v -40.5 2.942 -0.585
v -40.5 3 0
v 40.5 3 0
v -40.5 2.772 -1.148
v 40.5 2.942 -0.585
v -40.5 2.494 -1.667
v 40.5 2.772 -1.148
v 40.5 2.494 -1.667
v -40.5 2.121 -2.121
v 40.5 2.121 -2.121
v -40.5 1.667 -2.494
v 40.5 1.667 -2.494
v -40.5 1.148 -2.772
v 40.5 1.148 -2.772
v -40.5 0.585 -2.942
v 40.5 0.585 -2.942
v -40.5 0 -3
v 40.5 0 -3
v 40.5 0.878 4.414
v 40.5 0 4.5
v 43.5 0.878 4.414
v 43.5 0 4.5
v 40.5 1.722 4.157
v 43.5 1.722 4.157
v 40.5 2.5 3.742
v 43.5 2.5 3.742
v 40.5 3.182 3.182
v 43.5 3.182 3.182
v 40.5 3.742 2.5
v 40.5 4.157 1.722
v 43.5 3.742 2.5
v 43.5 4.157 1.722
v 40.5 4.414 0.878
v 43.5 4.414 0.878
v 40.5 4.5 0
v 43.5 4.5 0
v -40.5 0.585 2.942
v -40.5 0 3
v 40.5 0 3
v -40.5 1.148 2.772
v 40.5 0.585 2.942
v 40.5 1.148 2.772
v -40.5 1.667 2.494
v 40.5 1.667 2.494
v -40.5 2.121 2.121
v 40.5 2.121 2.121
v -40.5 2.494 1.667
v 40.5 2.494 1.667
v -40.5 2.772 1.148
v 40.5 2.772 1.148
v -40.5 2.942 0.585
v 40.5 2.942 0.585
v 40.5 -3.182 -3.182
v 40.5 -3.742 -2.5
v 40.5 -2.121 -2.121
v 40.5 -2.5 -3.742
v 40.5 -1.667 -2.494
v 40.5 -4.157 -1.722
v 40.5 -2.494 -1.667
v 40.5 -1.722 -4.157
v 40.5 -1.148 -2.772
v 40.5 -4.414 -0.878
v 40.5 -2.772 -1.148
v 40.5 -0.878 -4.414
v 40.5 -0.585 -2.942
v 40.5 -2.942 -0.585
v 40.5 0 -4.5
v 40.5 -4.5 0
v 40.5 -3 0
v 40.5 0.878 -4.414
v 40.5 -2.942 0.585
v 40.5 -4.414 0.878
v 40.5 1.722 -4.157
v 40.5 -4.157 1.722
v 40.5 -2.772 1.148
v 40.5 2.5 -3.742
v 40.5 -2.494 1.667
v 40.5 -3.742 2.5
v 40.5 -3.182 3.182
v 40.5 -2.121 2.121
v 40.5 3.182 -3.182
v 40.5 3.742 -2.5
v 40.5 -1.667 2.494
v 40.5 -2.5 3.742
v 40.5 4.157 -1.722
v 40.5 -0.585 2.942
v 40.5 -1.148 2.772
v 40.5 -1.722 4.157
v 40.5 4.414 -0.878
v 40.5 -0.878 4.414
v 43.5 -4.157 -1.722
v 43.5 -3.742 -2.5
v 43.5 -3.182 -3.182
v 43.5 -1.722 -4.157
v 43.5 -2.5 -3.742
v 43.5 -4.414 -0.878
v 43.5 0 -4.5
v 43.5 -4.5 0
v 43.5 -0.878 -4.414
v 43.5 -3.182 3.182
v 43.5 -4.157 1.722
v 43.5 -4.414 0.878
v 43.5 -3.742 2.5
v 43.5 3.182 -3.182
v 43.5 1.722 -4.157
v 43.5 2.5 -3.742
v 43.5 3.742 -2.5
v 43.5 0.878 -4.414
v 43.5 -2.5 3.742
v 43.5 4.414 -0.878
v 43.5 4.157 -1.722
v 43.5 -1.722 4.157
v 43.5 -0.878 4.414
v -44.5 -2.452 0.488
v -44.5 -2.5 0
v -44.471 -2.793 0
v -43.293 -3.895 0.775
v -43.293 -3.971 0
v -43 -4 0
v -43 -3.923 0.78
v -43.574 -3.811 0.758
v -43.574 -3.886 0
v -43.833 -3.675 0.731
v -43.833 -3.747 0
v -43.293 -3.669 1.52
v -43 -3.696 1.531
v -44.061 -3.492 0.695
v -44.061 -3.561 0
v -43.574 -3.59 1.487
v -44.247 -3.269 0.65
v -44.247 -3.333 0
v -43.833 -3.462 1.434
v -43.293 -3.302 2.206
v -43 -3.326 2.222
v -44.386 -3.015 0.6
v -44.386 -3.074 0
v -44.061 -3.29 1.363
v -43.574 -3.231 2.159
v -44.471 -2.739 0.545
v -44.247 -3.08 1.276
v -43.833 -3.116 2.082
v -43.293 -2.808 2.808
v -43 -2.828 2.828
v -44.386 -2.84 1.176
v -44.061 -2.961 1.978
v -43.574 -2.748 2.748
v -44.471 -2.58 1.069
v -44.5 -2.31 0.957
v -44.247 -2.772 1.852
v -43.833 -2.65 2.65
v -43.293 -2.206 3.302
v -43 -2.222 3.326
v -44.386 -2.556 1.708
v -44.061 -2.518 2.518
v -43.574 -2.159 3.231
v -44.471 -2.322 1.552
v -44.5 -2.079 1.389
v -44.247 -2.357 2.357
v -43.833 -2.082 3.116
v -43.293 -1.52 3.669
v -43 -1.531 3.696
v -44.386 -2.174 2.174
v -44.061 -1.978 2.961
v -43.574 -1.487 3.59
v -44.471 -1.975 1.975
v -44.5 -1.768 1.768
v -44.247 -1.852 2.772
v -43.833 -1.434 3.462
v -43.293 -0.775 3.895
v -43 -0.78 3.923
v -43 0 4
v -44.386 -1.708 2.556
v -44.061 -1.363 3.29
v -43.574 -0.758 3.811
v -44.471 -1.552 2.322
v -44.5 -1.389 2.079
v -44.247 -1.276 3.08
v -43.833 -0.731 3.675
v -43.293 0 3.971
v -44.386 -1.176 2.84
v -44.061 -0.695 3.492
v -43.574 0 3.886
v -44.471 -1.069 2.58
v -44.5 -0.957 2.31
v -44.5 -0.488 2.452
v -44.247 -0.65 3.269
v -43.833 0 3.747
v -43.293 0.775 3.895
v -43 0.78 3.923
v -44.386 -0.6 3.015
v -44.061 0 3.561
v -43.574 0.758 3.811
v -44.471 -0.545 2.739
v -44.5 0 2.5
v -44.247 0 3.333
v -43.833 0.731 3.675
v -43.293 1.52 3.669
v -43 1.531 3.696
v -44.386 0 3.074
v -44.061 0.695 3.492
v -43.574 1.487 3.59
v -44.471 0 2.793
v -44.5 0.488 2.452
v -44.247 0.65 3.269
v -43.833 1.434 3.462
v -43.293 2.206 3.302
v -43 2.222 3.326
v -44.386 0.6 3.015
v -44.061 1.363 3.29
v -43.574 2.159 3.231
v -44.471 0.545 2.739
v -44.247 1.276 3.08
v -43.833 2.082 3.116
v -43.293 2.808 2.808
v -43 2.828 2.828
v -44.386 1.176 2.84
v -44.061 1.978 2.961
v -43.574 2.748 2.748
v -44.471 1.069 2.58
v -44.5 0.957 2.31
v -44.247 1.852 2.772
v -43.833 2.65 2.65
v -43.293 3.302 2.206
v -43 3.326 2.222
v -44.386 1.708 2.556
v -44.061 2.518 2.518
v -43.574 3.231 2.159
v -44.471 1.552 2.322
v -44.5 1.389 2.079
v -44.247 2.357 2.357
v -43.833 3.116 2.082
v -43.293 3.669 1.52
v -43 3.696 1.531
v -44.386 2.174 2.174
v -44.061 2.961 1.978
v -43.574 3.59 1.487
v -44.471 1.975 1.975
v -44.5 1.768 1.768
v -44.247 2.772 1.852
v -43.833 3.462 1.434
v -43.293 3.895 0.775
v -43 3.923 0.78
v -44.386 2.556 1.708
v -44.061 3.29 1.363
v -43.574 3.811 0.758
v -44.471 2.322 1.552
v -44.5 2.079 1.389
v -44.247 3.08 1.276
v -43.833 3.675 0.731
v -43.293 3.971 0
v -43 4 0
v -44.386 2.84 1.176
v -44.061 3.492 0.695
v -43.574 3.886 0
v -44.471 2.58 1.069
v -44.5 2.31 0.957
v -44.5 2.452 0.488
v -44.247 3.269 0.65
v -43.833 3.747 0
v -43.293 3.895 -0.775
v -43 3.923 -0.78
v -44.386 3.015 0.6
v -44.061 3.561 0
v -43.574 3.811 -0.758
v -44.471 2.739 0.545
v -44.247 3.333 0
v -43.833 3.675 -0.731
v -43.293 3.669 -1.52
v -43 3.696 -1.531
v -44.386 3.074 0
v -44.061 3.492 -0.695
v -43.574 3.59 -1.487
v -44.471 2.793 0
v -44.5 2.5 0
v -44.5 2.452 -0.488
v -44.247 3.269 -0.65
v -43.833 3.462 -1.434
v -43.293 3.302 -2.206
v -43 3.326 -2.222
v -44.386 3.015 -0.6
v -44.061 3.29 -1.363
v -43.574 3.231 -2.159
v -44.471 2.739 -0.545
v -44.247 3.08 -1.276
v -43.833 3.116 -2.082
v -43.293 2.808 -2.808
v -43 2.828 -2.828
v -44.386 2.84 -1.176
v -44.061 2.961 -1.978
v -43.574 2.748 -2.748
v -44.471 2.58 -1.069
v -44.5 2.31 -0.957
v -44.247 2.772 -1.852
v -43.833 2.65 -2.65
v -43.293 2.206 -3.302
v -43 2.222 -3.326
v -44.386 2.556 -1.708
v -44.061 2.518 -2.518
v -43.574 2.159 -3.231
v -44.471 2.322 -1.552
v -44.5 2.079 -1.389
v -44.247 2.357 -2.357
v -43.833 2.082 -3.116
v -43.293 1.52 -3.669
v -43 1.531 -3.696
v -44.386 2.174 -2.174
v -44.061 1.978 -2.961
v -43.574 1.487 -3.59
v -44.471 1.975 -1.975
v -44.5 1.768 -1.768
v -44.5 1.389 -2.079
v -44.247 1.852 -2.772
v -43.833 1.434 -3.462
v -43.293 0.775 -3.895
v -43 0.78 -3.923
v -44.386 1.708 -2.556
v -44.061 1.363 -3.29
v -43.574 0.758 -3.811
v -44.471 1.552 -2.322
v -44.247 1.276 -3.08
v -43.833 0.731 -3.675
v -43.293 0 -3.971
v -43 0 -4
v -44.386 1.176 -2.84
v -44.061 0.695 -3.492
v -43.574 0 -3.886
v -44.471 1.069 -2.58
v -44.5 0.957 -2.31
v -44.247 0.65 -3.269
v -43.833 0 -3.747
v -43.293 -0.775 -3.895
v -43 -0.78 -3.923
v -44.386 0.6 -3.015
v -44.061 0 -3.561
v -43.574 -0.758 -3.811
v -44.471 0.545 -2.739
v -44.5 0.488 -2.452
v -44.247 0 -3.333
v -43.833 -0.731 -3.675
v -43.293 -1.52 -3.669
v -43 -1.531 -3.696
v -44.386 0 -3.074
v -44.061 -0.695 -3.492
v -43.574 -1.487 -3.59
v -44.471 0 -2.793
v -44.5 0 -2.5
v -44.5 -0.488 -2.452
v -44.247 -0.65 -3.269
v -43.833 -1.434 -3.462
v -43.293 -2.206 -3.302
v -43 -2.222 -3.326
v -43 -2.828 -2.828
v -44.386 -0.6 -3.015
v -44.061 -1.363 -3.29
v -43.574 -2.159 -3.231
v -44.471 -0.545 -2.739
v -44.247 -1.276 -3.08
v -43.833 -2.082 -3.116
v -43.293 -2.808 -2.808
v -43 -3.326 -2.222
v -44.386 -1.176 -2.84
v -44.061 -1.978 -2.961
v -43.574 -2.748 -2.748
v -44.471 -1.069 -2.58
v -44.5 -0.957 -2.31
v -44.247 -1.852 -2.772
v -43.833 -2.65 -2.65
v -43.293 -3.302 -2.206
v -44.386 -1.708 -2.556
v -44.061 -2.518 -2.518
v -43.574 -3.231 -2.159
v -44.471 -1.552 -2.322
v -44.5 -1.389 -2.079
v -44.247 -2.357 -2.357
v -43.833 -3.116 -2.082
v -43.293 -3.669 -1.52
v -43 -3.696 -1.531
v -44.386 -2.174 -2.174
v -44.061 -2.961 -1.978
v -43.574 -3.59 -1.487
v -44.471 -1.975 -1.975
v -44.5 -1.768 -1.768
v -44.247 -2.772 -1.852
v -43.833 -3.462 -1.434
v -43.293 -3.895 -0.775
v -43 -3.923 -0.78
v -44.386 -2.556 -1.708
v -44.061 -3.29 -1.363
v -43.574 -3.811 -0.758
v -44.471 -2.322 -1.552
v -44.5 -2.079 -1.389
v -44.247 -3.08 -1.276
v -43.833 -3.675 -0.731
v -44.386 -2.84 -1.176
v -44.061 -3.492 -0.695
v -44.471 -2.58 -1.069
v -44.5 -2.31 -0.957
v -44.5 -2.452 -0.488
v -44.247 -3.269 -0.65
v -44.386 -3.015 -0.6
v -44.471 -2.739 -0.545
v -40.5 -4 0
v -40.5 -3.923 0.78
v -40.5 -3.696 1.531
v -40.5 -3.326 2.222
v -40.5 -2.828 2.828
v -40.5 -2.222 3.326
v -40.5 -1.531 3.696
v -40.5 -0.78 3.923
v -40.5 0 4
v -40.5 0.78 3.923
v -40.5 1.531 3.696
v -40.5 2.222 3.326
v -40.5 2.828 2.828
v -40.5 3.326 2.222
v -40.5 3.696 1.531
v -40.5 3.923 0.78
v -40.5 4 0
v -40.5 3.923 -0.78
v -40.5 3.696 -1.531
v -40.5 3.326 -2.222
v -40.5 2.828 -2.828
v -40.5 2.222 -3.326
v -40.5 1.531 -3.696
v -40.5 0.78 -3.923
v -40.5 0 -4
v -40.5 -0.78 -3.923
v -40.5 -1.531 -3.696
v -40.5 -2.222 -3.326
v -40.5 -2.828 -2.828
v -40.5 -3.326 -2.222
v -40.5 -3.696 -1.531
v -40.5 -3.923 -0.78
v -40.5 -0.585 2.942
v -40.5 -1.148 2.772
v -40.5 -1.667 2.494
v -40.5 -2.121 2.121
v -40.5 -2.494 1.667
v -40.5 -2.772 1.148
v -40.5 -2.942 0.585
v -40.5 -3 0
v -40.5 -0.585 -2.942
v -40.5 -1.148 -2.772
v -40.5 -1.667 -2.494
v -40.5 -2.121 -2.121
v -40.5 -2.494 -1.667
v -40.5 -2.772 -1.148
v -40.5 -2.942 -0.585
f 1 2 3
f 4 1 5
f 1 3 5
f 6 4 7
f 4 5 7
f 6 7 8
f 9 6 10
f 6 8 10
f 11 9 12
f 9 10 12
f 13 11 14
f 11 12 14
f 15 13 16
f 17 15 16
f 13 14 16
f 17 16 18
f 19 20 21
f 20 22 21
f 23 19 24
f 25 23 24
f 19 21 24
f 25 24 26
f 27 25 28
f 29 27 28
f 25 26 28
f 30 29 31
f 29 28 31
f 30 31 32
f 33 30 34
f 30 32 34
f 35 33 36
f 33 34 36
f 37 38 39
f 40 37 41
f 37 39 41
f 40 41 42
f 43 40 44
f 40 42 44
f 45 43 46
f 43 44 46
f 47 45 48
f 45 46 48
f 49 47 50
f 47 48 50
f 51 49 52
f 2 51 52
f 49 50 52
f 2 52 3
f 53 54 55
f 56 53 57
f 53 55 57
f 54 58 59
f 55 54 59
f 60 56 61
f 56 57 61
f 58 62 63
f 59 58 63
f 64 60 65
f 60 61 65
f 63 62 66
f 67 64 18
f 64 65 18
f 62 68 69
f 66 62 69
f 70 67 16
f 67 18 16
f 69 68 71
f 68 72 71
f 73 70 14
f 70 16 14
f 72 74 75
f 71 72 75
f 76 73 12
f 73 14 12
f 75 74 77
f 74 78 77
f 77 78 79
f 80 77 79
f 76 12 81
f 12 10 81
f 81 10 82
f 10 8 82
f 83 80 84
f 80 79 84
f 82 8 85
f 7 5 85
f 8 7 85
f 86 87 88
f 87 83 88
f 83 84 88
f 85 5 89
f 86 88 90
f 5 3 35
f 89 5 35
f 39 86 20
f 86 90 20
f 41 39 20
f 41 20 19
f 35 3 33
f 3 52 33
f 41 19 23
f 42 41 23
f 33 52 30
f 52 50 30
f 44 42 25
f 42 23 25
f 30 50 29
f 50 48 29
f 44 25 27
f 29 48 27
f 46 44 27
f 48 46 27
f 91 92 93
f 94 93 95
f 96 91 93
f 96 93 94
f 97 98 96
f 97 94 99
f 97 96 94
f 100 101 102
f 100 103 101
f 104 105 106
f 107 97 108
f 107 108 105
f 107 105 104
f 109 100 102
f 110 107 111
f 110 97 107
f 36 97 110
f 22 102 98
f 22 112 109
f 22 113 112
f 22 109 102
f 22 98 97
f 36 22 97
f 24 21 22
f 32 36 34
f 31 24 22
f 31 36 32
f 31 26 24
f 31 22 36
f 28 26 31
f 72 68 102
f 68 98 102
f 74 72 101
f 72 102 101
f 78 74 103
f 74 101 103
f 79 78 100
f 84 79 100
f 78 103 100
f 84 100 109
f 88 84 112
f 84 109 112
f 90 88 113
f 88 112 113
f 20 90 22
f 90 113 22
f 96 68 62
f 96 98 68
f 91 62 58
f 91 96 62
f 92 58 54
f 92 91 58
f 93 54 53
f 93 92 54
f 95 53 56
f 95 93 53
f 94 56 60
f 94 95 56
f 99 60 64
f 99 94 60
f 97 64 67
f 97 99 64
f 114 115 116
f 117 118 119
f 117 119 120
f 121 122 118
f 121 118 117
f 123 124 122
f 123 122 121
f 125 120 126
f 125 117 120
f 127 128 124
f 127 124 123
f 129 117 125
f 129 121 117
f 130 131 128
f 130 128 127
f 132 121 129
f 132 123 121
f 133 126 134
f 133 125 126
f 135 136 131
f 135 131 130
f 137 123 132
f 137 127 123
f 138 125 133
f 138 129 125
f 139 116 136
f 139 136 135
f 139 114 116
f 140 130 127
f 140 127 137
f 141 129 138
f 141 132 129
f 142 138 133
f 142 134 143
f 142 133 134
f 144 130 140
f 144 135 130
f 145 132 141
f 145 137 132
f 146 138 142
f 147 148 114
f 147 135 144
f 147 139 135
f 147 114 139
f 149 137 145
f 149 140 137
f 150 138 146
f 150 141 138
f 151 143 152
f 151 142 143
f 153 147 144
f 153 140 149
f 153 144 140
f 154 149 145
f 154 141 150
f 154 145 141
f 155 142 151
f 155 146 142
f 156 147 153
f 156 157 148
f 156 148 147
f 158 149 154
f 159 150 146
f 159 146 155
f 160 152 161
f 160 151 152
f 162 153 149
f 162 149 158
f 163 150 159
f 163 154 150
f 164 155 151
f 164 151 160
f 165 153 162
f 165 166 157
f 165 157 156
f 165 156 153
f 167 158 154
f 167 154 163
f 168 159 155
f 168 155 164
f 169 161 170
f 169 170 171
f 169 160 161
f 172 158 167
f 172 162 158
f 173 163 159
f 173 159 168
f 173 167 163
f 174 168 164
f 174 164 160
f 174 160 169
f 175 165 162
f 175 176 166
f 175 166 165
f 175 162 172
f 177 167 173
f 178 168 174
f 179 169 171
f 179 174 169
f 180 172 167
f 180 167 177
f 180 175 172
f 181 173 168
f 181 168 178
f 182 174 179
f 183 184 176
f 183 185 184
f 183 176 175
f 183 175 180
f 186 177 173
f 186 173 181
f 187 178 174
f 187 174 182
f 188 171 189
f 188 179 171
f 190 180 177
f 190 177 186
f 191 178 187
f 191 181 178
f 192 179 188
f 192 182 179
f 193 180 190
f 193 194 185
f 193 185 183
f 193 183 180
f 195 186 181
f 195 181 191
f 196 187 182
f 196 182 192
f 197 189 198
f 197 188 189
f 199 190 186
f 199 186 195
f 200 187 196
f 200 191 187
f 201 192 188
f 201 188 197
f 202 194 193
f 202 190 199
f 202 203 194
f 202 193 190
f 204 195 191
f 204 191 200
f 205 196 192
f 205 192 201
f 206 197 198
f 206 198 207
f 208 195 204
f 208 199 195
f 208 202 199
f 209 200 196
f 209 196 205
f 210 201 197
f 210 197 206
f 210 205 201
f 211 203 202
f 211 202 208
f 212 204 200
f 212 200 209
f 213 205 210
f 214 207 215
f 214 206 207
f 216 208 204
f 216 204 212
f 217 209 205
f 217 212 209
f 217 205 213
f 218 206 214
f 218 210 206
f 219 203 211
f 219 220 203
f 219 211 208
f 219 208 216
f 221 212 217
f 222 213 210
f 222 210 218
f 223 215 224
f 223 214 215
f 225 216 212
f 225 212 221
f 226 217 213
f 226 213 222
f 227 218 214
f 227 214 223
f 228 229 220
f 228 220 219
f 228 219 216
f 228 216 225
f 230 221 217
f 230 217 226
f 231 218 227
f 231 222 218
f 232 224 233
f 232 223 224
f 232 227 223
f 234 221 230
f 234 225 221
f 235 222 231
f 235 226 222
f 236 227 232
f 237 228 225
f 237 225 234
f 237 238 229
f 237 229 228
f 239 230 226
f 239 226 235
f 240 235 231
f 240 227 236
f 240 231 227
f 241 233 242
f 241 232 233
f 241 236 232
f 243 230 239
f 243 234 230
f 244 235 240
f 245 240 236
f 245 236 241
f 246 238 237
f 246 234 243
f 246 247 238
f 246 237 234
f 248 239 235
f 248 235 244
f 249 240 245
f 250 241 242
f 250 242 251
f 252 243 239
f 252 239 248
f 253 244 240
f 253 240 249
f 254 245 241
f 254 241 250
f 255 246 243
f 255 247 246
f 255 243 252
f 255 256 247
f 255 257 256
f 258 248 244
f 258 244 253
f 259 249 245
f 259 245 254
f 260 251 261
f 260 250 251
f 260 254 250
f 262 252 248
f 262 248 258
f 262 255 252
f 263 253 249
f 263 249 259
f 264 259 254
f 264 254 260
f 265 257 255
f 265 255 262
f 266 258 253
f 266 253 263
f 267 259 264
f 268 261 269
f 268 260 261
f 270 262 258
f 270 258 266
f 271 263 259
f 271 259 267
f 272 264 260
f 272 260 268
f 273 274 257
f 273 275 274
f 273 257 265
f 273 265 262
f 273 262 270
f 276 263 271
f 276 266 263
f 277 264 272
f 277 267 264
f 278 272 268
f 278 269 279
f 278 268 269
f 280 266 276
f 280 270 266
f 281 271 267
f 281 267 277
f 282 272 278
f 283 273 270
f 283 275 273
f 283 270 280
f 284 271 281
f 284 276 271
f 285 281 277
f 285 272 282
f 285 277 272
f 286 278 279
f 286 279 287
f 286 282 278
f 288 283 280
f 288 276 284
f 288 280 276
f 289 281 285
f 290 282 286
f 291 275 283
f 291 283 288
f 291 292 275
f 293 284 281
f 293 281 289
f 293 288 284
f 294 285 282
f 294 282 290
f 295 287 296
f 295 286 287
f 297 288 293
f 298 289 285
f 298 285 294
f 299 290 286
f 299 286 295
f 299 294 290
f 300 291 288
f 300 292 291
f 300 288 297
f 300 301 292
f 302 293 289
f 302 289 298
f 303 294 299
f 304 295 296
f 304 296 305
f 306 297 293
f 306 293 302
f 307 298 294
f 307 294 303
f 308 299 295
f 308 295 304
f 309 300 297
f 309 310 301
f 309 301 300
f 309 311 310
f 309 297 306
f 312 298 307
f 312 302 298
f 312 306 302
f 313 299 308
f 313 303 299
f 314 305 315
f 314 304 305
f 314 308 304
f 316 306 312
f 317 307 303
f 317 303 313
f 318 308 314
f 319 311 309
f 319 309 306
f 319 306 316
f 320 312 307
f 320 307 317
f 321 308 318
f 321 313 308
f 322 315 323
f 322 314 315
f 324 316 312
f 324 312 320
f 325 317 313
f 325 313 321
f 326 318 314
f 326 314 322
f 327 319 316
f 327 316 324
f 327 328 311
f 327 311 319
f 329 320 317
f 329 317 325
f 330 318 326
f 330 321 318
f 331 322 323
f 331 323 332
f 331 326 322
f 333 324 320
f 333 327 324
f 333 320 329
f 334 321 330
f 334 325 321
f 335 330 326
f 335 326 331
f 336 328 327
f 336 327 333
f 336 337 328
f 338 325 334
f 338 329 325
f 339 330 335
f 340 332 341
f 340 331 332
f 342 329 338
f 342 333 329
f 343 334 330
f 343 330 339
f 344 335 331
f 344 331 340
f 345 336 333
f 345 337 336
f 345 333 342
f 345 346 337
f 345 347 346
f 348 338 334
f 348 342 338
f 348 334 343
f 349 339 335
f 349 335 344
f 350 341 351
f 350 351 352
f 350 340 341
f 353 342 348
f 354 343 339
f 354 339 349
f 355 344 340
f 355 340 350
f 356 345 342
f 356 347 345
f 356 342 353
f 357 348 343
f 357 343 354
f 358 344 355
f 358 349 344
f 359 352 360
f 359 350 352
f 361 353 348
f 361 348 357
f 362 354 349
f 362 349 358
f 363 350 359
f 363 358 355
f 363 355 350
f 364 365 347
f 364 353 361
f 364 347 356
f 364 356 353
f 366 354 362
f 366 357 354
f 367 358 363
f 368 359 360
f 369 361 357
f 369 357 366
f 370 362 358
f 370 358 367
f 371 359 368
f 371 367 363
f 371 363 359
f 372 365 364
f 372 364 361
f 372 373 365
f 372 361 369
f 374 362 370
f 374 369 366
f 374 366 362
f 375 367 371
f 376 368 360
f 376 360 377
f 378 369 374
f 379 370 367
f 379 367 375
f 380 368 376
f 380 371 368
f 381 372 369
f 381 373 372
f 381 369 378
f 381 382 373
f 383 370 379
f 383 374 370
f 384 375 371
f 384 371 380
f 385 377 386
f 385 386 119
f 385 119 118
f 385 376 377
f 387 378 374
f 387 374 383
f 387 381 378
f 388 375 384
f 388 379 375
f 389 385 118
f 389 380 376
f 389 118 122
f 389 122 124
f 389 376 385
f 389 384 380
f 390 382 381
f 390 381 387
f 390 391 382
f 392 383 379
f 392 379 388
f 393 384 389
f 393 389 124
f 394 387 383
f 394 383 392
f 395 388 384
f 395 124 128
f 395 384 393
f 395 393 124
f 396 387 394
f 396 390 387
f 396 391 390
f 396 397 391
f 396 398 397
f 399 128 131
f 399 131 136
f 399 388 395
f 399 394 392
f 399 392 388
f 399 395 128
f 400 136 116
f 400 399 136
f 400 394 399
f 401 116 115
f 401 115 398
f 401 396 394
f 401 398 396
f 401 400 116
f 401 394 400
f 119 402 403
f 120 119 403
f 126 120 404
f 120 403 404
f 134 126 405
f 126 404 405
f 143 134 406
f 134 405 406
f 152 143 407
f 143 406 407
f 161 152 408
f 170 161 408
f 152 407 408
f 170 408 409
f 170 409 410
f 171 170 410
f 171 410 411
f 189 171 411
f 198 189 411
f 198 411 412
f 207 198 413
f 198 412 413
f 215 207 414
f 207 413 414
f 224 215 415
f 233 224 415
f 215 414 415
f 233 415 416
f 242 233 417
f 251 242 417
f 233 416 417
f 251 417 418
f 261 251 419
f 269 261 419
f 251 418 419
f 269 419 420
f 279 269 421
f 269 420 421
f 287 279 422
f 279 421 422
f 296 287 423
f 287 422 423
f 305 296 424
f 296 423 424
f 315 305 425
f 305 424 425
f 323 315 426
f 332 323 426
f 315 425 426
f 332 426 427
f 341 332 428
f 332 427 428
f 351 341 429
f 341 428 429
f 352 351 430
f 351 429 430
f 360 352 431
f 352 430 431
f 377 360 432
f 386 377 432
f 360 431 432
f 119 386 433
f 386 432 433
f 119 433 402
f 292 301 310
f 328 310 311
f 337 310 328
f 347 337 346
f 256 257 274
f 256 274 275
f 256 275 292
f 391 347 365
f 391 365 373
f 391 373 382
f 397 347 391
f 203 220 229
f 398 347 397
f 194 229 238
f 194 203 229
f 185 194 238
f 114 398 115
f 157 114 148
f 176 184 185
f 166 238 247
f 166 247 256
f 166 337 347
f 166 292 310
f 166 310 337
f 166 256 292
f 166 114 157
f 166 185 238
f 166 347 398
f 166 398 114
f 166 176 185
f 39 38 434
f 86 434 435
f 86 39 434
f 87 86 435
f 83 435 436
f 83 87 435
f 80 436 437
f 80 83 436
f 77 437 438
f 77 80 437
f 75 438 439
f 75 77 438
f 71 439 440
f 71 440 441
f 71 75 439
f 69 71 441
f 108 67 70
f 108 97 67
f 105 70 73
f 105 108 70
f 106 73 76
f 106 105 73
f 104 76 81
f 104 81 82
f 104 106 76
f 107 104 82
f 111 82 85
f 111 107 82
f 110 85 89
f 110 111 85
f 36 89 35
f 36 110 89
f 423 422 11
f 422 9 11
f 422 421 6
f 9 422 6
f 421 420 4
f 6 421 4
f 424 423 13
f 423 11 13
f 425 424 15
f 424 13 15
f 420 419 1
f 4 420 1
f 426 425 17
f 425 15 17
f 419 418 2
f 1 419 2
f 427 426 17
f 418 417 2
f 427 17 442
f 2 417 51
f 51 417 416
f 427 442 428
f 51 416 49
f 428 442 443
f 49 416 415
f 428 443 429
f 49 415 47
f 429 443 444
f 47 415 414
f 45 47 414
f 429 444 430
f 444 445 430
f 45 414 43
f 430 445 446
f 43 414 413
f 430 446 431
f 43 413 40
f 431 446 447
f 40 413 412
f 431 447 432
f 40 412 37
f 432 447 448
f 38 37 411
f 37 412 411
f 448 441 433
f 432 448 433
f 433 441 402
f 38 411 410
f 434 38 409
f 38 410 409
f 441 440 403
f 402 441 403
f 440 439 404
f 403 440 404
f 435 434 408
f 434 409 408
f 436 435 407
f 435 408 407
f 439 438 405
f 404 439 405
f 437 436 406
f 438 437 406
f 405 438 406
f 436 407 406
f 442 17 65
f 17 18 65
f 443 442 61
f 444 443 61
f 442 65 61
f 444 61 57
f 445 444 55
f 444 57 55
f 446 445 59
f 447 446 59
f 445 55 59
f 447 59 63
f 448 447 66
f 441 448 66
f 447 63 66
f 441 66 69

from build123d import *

# Parameters (mm, degrees)
F0_W     = 81
F0_H     = 6
F1_DEPTH = 3
F3_R     = 2.99999
F2_W     = 9
F2_H     = 9
F2_W_2   = 6
F2_H_2   = 6
F4_DEPTH = 3
F5_R     = 4.49999
F6_R     = 4
F7_DEPTH = 4
F8_R     = 1.5


# Not quite as in the source:
# - a fillet or chamfer is up to 0.001 mm smaller than in the source, because OpenCascade refuses the exact size
# - ends of sketch curves that miss each other by under 0.0002 mm in the source are joined


with BuildPart() as f1:
    # F0 (on Top) → F1 (new body, symmetric)
    with BuildSketch(Plane.XY):
        Rectangle(F0_W, F0_H)
    extrude(amount=F1_DEPTH, both=True)

    # F3 (radius 3 in the source; OpenCascade refuses exactly that, so slightly less here)
    f3_edges = [f1.edges().sort_by_distance(p)[0] for p in [
        (0, -3, 3),
        (0, -3, -3),
        (0, 3, 3),
        (0, 3, -3),
    ]]
    fillet(f3_edges, radius=F3_R)

    # F2 (on face) → F4 (join)
    with BuildSketch(Plane.YZ.offset(40.5)):
        Rectangle(F2_W, F2_H)
        Rectangle(F2_W_2, F2_H_2, mode=Mode.SUBTRACT)
        Rectangle(F2_W_2, F2_H_2)
    extrude(amount=F4_DEPTH)

    # F5 (radius 4.5 in the source; OpenCascade refuses exactly that, so slightly less here)
    f5_edges = [f1.edges().sort_by_distance(p)[0] for p in [
        (42, 4.5, 4.5),
        (42, -4.5, 4.5),
        (42, -4.5, -4.5),
        (42, 4.5, -4.5),
    ]]
    fillet(f5_edges, radius=F5_R)

    # F6 (on face) → F7 (join)
    with BuildSketch(Plane(origin=(-40.5, 0, 0), x_dir=(0, -1, 0), z_dir=(-1, 0, 0))):
        Circle(F6_R)
        with BuildLine():
            ThreePointArc((-1e-05, -3), (-2.1213232725, -2.1213232725), (-3, -1e-05))
            ThreePointArc((-3, -1e-05), (-2.1213232725, 2.1213232725), (-1e-05, 3))
            ThreePointArc((-1e-05, 3), (2.1213232725, 2.1213232725), (3, 1e-05))
            ThreePointArc((3, 1e-05), (2.1213232725, -2.1213232725), (-1e-05, -3))
        make_face(mode=Mode.SUBTRACT)
        with BuildLine():
            ThreePointArc((-1e-05, 3), (-2.1213232725, 2.1213232725), (-3, 1e-05))
            ThreePointArc((-3, 1e-05), (-2.1213232725, -2.1213232725), (-1e-05, -3))
            ThreePointArc((-1e-05, -3), (2.1213232725, -2.1213232725), (3, -1e-05))
            ThreePointArc((3, -1e-05), (2.1213232725, 2.1213232725), (-1e-05, 3))
        make_face()
    extrude(amount=F7_DEPTH)

    # F8
    f8_edges = [f1.edges().sort_by_distance(p)[0] for p in [
        (-44.5, 4, 0),
    ]]
    fillet(f8_edges, radius=F8_R)


solid = f1.part
